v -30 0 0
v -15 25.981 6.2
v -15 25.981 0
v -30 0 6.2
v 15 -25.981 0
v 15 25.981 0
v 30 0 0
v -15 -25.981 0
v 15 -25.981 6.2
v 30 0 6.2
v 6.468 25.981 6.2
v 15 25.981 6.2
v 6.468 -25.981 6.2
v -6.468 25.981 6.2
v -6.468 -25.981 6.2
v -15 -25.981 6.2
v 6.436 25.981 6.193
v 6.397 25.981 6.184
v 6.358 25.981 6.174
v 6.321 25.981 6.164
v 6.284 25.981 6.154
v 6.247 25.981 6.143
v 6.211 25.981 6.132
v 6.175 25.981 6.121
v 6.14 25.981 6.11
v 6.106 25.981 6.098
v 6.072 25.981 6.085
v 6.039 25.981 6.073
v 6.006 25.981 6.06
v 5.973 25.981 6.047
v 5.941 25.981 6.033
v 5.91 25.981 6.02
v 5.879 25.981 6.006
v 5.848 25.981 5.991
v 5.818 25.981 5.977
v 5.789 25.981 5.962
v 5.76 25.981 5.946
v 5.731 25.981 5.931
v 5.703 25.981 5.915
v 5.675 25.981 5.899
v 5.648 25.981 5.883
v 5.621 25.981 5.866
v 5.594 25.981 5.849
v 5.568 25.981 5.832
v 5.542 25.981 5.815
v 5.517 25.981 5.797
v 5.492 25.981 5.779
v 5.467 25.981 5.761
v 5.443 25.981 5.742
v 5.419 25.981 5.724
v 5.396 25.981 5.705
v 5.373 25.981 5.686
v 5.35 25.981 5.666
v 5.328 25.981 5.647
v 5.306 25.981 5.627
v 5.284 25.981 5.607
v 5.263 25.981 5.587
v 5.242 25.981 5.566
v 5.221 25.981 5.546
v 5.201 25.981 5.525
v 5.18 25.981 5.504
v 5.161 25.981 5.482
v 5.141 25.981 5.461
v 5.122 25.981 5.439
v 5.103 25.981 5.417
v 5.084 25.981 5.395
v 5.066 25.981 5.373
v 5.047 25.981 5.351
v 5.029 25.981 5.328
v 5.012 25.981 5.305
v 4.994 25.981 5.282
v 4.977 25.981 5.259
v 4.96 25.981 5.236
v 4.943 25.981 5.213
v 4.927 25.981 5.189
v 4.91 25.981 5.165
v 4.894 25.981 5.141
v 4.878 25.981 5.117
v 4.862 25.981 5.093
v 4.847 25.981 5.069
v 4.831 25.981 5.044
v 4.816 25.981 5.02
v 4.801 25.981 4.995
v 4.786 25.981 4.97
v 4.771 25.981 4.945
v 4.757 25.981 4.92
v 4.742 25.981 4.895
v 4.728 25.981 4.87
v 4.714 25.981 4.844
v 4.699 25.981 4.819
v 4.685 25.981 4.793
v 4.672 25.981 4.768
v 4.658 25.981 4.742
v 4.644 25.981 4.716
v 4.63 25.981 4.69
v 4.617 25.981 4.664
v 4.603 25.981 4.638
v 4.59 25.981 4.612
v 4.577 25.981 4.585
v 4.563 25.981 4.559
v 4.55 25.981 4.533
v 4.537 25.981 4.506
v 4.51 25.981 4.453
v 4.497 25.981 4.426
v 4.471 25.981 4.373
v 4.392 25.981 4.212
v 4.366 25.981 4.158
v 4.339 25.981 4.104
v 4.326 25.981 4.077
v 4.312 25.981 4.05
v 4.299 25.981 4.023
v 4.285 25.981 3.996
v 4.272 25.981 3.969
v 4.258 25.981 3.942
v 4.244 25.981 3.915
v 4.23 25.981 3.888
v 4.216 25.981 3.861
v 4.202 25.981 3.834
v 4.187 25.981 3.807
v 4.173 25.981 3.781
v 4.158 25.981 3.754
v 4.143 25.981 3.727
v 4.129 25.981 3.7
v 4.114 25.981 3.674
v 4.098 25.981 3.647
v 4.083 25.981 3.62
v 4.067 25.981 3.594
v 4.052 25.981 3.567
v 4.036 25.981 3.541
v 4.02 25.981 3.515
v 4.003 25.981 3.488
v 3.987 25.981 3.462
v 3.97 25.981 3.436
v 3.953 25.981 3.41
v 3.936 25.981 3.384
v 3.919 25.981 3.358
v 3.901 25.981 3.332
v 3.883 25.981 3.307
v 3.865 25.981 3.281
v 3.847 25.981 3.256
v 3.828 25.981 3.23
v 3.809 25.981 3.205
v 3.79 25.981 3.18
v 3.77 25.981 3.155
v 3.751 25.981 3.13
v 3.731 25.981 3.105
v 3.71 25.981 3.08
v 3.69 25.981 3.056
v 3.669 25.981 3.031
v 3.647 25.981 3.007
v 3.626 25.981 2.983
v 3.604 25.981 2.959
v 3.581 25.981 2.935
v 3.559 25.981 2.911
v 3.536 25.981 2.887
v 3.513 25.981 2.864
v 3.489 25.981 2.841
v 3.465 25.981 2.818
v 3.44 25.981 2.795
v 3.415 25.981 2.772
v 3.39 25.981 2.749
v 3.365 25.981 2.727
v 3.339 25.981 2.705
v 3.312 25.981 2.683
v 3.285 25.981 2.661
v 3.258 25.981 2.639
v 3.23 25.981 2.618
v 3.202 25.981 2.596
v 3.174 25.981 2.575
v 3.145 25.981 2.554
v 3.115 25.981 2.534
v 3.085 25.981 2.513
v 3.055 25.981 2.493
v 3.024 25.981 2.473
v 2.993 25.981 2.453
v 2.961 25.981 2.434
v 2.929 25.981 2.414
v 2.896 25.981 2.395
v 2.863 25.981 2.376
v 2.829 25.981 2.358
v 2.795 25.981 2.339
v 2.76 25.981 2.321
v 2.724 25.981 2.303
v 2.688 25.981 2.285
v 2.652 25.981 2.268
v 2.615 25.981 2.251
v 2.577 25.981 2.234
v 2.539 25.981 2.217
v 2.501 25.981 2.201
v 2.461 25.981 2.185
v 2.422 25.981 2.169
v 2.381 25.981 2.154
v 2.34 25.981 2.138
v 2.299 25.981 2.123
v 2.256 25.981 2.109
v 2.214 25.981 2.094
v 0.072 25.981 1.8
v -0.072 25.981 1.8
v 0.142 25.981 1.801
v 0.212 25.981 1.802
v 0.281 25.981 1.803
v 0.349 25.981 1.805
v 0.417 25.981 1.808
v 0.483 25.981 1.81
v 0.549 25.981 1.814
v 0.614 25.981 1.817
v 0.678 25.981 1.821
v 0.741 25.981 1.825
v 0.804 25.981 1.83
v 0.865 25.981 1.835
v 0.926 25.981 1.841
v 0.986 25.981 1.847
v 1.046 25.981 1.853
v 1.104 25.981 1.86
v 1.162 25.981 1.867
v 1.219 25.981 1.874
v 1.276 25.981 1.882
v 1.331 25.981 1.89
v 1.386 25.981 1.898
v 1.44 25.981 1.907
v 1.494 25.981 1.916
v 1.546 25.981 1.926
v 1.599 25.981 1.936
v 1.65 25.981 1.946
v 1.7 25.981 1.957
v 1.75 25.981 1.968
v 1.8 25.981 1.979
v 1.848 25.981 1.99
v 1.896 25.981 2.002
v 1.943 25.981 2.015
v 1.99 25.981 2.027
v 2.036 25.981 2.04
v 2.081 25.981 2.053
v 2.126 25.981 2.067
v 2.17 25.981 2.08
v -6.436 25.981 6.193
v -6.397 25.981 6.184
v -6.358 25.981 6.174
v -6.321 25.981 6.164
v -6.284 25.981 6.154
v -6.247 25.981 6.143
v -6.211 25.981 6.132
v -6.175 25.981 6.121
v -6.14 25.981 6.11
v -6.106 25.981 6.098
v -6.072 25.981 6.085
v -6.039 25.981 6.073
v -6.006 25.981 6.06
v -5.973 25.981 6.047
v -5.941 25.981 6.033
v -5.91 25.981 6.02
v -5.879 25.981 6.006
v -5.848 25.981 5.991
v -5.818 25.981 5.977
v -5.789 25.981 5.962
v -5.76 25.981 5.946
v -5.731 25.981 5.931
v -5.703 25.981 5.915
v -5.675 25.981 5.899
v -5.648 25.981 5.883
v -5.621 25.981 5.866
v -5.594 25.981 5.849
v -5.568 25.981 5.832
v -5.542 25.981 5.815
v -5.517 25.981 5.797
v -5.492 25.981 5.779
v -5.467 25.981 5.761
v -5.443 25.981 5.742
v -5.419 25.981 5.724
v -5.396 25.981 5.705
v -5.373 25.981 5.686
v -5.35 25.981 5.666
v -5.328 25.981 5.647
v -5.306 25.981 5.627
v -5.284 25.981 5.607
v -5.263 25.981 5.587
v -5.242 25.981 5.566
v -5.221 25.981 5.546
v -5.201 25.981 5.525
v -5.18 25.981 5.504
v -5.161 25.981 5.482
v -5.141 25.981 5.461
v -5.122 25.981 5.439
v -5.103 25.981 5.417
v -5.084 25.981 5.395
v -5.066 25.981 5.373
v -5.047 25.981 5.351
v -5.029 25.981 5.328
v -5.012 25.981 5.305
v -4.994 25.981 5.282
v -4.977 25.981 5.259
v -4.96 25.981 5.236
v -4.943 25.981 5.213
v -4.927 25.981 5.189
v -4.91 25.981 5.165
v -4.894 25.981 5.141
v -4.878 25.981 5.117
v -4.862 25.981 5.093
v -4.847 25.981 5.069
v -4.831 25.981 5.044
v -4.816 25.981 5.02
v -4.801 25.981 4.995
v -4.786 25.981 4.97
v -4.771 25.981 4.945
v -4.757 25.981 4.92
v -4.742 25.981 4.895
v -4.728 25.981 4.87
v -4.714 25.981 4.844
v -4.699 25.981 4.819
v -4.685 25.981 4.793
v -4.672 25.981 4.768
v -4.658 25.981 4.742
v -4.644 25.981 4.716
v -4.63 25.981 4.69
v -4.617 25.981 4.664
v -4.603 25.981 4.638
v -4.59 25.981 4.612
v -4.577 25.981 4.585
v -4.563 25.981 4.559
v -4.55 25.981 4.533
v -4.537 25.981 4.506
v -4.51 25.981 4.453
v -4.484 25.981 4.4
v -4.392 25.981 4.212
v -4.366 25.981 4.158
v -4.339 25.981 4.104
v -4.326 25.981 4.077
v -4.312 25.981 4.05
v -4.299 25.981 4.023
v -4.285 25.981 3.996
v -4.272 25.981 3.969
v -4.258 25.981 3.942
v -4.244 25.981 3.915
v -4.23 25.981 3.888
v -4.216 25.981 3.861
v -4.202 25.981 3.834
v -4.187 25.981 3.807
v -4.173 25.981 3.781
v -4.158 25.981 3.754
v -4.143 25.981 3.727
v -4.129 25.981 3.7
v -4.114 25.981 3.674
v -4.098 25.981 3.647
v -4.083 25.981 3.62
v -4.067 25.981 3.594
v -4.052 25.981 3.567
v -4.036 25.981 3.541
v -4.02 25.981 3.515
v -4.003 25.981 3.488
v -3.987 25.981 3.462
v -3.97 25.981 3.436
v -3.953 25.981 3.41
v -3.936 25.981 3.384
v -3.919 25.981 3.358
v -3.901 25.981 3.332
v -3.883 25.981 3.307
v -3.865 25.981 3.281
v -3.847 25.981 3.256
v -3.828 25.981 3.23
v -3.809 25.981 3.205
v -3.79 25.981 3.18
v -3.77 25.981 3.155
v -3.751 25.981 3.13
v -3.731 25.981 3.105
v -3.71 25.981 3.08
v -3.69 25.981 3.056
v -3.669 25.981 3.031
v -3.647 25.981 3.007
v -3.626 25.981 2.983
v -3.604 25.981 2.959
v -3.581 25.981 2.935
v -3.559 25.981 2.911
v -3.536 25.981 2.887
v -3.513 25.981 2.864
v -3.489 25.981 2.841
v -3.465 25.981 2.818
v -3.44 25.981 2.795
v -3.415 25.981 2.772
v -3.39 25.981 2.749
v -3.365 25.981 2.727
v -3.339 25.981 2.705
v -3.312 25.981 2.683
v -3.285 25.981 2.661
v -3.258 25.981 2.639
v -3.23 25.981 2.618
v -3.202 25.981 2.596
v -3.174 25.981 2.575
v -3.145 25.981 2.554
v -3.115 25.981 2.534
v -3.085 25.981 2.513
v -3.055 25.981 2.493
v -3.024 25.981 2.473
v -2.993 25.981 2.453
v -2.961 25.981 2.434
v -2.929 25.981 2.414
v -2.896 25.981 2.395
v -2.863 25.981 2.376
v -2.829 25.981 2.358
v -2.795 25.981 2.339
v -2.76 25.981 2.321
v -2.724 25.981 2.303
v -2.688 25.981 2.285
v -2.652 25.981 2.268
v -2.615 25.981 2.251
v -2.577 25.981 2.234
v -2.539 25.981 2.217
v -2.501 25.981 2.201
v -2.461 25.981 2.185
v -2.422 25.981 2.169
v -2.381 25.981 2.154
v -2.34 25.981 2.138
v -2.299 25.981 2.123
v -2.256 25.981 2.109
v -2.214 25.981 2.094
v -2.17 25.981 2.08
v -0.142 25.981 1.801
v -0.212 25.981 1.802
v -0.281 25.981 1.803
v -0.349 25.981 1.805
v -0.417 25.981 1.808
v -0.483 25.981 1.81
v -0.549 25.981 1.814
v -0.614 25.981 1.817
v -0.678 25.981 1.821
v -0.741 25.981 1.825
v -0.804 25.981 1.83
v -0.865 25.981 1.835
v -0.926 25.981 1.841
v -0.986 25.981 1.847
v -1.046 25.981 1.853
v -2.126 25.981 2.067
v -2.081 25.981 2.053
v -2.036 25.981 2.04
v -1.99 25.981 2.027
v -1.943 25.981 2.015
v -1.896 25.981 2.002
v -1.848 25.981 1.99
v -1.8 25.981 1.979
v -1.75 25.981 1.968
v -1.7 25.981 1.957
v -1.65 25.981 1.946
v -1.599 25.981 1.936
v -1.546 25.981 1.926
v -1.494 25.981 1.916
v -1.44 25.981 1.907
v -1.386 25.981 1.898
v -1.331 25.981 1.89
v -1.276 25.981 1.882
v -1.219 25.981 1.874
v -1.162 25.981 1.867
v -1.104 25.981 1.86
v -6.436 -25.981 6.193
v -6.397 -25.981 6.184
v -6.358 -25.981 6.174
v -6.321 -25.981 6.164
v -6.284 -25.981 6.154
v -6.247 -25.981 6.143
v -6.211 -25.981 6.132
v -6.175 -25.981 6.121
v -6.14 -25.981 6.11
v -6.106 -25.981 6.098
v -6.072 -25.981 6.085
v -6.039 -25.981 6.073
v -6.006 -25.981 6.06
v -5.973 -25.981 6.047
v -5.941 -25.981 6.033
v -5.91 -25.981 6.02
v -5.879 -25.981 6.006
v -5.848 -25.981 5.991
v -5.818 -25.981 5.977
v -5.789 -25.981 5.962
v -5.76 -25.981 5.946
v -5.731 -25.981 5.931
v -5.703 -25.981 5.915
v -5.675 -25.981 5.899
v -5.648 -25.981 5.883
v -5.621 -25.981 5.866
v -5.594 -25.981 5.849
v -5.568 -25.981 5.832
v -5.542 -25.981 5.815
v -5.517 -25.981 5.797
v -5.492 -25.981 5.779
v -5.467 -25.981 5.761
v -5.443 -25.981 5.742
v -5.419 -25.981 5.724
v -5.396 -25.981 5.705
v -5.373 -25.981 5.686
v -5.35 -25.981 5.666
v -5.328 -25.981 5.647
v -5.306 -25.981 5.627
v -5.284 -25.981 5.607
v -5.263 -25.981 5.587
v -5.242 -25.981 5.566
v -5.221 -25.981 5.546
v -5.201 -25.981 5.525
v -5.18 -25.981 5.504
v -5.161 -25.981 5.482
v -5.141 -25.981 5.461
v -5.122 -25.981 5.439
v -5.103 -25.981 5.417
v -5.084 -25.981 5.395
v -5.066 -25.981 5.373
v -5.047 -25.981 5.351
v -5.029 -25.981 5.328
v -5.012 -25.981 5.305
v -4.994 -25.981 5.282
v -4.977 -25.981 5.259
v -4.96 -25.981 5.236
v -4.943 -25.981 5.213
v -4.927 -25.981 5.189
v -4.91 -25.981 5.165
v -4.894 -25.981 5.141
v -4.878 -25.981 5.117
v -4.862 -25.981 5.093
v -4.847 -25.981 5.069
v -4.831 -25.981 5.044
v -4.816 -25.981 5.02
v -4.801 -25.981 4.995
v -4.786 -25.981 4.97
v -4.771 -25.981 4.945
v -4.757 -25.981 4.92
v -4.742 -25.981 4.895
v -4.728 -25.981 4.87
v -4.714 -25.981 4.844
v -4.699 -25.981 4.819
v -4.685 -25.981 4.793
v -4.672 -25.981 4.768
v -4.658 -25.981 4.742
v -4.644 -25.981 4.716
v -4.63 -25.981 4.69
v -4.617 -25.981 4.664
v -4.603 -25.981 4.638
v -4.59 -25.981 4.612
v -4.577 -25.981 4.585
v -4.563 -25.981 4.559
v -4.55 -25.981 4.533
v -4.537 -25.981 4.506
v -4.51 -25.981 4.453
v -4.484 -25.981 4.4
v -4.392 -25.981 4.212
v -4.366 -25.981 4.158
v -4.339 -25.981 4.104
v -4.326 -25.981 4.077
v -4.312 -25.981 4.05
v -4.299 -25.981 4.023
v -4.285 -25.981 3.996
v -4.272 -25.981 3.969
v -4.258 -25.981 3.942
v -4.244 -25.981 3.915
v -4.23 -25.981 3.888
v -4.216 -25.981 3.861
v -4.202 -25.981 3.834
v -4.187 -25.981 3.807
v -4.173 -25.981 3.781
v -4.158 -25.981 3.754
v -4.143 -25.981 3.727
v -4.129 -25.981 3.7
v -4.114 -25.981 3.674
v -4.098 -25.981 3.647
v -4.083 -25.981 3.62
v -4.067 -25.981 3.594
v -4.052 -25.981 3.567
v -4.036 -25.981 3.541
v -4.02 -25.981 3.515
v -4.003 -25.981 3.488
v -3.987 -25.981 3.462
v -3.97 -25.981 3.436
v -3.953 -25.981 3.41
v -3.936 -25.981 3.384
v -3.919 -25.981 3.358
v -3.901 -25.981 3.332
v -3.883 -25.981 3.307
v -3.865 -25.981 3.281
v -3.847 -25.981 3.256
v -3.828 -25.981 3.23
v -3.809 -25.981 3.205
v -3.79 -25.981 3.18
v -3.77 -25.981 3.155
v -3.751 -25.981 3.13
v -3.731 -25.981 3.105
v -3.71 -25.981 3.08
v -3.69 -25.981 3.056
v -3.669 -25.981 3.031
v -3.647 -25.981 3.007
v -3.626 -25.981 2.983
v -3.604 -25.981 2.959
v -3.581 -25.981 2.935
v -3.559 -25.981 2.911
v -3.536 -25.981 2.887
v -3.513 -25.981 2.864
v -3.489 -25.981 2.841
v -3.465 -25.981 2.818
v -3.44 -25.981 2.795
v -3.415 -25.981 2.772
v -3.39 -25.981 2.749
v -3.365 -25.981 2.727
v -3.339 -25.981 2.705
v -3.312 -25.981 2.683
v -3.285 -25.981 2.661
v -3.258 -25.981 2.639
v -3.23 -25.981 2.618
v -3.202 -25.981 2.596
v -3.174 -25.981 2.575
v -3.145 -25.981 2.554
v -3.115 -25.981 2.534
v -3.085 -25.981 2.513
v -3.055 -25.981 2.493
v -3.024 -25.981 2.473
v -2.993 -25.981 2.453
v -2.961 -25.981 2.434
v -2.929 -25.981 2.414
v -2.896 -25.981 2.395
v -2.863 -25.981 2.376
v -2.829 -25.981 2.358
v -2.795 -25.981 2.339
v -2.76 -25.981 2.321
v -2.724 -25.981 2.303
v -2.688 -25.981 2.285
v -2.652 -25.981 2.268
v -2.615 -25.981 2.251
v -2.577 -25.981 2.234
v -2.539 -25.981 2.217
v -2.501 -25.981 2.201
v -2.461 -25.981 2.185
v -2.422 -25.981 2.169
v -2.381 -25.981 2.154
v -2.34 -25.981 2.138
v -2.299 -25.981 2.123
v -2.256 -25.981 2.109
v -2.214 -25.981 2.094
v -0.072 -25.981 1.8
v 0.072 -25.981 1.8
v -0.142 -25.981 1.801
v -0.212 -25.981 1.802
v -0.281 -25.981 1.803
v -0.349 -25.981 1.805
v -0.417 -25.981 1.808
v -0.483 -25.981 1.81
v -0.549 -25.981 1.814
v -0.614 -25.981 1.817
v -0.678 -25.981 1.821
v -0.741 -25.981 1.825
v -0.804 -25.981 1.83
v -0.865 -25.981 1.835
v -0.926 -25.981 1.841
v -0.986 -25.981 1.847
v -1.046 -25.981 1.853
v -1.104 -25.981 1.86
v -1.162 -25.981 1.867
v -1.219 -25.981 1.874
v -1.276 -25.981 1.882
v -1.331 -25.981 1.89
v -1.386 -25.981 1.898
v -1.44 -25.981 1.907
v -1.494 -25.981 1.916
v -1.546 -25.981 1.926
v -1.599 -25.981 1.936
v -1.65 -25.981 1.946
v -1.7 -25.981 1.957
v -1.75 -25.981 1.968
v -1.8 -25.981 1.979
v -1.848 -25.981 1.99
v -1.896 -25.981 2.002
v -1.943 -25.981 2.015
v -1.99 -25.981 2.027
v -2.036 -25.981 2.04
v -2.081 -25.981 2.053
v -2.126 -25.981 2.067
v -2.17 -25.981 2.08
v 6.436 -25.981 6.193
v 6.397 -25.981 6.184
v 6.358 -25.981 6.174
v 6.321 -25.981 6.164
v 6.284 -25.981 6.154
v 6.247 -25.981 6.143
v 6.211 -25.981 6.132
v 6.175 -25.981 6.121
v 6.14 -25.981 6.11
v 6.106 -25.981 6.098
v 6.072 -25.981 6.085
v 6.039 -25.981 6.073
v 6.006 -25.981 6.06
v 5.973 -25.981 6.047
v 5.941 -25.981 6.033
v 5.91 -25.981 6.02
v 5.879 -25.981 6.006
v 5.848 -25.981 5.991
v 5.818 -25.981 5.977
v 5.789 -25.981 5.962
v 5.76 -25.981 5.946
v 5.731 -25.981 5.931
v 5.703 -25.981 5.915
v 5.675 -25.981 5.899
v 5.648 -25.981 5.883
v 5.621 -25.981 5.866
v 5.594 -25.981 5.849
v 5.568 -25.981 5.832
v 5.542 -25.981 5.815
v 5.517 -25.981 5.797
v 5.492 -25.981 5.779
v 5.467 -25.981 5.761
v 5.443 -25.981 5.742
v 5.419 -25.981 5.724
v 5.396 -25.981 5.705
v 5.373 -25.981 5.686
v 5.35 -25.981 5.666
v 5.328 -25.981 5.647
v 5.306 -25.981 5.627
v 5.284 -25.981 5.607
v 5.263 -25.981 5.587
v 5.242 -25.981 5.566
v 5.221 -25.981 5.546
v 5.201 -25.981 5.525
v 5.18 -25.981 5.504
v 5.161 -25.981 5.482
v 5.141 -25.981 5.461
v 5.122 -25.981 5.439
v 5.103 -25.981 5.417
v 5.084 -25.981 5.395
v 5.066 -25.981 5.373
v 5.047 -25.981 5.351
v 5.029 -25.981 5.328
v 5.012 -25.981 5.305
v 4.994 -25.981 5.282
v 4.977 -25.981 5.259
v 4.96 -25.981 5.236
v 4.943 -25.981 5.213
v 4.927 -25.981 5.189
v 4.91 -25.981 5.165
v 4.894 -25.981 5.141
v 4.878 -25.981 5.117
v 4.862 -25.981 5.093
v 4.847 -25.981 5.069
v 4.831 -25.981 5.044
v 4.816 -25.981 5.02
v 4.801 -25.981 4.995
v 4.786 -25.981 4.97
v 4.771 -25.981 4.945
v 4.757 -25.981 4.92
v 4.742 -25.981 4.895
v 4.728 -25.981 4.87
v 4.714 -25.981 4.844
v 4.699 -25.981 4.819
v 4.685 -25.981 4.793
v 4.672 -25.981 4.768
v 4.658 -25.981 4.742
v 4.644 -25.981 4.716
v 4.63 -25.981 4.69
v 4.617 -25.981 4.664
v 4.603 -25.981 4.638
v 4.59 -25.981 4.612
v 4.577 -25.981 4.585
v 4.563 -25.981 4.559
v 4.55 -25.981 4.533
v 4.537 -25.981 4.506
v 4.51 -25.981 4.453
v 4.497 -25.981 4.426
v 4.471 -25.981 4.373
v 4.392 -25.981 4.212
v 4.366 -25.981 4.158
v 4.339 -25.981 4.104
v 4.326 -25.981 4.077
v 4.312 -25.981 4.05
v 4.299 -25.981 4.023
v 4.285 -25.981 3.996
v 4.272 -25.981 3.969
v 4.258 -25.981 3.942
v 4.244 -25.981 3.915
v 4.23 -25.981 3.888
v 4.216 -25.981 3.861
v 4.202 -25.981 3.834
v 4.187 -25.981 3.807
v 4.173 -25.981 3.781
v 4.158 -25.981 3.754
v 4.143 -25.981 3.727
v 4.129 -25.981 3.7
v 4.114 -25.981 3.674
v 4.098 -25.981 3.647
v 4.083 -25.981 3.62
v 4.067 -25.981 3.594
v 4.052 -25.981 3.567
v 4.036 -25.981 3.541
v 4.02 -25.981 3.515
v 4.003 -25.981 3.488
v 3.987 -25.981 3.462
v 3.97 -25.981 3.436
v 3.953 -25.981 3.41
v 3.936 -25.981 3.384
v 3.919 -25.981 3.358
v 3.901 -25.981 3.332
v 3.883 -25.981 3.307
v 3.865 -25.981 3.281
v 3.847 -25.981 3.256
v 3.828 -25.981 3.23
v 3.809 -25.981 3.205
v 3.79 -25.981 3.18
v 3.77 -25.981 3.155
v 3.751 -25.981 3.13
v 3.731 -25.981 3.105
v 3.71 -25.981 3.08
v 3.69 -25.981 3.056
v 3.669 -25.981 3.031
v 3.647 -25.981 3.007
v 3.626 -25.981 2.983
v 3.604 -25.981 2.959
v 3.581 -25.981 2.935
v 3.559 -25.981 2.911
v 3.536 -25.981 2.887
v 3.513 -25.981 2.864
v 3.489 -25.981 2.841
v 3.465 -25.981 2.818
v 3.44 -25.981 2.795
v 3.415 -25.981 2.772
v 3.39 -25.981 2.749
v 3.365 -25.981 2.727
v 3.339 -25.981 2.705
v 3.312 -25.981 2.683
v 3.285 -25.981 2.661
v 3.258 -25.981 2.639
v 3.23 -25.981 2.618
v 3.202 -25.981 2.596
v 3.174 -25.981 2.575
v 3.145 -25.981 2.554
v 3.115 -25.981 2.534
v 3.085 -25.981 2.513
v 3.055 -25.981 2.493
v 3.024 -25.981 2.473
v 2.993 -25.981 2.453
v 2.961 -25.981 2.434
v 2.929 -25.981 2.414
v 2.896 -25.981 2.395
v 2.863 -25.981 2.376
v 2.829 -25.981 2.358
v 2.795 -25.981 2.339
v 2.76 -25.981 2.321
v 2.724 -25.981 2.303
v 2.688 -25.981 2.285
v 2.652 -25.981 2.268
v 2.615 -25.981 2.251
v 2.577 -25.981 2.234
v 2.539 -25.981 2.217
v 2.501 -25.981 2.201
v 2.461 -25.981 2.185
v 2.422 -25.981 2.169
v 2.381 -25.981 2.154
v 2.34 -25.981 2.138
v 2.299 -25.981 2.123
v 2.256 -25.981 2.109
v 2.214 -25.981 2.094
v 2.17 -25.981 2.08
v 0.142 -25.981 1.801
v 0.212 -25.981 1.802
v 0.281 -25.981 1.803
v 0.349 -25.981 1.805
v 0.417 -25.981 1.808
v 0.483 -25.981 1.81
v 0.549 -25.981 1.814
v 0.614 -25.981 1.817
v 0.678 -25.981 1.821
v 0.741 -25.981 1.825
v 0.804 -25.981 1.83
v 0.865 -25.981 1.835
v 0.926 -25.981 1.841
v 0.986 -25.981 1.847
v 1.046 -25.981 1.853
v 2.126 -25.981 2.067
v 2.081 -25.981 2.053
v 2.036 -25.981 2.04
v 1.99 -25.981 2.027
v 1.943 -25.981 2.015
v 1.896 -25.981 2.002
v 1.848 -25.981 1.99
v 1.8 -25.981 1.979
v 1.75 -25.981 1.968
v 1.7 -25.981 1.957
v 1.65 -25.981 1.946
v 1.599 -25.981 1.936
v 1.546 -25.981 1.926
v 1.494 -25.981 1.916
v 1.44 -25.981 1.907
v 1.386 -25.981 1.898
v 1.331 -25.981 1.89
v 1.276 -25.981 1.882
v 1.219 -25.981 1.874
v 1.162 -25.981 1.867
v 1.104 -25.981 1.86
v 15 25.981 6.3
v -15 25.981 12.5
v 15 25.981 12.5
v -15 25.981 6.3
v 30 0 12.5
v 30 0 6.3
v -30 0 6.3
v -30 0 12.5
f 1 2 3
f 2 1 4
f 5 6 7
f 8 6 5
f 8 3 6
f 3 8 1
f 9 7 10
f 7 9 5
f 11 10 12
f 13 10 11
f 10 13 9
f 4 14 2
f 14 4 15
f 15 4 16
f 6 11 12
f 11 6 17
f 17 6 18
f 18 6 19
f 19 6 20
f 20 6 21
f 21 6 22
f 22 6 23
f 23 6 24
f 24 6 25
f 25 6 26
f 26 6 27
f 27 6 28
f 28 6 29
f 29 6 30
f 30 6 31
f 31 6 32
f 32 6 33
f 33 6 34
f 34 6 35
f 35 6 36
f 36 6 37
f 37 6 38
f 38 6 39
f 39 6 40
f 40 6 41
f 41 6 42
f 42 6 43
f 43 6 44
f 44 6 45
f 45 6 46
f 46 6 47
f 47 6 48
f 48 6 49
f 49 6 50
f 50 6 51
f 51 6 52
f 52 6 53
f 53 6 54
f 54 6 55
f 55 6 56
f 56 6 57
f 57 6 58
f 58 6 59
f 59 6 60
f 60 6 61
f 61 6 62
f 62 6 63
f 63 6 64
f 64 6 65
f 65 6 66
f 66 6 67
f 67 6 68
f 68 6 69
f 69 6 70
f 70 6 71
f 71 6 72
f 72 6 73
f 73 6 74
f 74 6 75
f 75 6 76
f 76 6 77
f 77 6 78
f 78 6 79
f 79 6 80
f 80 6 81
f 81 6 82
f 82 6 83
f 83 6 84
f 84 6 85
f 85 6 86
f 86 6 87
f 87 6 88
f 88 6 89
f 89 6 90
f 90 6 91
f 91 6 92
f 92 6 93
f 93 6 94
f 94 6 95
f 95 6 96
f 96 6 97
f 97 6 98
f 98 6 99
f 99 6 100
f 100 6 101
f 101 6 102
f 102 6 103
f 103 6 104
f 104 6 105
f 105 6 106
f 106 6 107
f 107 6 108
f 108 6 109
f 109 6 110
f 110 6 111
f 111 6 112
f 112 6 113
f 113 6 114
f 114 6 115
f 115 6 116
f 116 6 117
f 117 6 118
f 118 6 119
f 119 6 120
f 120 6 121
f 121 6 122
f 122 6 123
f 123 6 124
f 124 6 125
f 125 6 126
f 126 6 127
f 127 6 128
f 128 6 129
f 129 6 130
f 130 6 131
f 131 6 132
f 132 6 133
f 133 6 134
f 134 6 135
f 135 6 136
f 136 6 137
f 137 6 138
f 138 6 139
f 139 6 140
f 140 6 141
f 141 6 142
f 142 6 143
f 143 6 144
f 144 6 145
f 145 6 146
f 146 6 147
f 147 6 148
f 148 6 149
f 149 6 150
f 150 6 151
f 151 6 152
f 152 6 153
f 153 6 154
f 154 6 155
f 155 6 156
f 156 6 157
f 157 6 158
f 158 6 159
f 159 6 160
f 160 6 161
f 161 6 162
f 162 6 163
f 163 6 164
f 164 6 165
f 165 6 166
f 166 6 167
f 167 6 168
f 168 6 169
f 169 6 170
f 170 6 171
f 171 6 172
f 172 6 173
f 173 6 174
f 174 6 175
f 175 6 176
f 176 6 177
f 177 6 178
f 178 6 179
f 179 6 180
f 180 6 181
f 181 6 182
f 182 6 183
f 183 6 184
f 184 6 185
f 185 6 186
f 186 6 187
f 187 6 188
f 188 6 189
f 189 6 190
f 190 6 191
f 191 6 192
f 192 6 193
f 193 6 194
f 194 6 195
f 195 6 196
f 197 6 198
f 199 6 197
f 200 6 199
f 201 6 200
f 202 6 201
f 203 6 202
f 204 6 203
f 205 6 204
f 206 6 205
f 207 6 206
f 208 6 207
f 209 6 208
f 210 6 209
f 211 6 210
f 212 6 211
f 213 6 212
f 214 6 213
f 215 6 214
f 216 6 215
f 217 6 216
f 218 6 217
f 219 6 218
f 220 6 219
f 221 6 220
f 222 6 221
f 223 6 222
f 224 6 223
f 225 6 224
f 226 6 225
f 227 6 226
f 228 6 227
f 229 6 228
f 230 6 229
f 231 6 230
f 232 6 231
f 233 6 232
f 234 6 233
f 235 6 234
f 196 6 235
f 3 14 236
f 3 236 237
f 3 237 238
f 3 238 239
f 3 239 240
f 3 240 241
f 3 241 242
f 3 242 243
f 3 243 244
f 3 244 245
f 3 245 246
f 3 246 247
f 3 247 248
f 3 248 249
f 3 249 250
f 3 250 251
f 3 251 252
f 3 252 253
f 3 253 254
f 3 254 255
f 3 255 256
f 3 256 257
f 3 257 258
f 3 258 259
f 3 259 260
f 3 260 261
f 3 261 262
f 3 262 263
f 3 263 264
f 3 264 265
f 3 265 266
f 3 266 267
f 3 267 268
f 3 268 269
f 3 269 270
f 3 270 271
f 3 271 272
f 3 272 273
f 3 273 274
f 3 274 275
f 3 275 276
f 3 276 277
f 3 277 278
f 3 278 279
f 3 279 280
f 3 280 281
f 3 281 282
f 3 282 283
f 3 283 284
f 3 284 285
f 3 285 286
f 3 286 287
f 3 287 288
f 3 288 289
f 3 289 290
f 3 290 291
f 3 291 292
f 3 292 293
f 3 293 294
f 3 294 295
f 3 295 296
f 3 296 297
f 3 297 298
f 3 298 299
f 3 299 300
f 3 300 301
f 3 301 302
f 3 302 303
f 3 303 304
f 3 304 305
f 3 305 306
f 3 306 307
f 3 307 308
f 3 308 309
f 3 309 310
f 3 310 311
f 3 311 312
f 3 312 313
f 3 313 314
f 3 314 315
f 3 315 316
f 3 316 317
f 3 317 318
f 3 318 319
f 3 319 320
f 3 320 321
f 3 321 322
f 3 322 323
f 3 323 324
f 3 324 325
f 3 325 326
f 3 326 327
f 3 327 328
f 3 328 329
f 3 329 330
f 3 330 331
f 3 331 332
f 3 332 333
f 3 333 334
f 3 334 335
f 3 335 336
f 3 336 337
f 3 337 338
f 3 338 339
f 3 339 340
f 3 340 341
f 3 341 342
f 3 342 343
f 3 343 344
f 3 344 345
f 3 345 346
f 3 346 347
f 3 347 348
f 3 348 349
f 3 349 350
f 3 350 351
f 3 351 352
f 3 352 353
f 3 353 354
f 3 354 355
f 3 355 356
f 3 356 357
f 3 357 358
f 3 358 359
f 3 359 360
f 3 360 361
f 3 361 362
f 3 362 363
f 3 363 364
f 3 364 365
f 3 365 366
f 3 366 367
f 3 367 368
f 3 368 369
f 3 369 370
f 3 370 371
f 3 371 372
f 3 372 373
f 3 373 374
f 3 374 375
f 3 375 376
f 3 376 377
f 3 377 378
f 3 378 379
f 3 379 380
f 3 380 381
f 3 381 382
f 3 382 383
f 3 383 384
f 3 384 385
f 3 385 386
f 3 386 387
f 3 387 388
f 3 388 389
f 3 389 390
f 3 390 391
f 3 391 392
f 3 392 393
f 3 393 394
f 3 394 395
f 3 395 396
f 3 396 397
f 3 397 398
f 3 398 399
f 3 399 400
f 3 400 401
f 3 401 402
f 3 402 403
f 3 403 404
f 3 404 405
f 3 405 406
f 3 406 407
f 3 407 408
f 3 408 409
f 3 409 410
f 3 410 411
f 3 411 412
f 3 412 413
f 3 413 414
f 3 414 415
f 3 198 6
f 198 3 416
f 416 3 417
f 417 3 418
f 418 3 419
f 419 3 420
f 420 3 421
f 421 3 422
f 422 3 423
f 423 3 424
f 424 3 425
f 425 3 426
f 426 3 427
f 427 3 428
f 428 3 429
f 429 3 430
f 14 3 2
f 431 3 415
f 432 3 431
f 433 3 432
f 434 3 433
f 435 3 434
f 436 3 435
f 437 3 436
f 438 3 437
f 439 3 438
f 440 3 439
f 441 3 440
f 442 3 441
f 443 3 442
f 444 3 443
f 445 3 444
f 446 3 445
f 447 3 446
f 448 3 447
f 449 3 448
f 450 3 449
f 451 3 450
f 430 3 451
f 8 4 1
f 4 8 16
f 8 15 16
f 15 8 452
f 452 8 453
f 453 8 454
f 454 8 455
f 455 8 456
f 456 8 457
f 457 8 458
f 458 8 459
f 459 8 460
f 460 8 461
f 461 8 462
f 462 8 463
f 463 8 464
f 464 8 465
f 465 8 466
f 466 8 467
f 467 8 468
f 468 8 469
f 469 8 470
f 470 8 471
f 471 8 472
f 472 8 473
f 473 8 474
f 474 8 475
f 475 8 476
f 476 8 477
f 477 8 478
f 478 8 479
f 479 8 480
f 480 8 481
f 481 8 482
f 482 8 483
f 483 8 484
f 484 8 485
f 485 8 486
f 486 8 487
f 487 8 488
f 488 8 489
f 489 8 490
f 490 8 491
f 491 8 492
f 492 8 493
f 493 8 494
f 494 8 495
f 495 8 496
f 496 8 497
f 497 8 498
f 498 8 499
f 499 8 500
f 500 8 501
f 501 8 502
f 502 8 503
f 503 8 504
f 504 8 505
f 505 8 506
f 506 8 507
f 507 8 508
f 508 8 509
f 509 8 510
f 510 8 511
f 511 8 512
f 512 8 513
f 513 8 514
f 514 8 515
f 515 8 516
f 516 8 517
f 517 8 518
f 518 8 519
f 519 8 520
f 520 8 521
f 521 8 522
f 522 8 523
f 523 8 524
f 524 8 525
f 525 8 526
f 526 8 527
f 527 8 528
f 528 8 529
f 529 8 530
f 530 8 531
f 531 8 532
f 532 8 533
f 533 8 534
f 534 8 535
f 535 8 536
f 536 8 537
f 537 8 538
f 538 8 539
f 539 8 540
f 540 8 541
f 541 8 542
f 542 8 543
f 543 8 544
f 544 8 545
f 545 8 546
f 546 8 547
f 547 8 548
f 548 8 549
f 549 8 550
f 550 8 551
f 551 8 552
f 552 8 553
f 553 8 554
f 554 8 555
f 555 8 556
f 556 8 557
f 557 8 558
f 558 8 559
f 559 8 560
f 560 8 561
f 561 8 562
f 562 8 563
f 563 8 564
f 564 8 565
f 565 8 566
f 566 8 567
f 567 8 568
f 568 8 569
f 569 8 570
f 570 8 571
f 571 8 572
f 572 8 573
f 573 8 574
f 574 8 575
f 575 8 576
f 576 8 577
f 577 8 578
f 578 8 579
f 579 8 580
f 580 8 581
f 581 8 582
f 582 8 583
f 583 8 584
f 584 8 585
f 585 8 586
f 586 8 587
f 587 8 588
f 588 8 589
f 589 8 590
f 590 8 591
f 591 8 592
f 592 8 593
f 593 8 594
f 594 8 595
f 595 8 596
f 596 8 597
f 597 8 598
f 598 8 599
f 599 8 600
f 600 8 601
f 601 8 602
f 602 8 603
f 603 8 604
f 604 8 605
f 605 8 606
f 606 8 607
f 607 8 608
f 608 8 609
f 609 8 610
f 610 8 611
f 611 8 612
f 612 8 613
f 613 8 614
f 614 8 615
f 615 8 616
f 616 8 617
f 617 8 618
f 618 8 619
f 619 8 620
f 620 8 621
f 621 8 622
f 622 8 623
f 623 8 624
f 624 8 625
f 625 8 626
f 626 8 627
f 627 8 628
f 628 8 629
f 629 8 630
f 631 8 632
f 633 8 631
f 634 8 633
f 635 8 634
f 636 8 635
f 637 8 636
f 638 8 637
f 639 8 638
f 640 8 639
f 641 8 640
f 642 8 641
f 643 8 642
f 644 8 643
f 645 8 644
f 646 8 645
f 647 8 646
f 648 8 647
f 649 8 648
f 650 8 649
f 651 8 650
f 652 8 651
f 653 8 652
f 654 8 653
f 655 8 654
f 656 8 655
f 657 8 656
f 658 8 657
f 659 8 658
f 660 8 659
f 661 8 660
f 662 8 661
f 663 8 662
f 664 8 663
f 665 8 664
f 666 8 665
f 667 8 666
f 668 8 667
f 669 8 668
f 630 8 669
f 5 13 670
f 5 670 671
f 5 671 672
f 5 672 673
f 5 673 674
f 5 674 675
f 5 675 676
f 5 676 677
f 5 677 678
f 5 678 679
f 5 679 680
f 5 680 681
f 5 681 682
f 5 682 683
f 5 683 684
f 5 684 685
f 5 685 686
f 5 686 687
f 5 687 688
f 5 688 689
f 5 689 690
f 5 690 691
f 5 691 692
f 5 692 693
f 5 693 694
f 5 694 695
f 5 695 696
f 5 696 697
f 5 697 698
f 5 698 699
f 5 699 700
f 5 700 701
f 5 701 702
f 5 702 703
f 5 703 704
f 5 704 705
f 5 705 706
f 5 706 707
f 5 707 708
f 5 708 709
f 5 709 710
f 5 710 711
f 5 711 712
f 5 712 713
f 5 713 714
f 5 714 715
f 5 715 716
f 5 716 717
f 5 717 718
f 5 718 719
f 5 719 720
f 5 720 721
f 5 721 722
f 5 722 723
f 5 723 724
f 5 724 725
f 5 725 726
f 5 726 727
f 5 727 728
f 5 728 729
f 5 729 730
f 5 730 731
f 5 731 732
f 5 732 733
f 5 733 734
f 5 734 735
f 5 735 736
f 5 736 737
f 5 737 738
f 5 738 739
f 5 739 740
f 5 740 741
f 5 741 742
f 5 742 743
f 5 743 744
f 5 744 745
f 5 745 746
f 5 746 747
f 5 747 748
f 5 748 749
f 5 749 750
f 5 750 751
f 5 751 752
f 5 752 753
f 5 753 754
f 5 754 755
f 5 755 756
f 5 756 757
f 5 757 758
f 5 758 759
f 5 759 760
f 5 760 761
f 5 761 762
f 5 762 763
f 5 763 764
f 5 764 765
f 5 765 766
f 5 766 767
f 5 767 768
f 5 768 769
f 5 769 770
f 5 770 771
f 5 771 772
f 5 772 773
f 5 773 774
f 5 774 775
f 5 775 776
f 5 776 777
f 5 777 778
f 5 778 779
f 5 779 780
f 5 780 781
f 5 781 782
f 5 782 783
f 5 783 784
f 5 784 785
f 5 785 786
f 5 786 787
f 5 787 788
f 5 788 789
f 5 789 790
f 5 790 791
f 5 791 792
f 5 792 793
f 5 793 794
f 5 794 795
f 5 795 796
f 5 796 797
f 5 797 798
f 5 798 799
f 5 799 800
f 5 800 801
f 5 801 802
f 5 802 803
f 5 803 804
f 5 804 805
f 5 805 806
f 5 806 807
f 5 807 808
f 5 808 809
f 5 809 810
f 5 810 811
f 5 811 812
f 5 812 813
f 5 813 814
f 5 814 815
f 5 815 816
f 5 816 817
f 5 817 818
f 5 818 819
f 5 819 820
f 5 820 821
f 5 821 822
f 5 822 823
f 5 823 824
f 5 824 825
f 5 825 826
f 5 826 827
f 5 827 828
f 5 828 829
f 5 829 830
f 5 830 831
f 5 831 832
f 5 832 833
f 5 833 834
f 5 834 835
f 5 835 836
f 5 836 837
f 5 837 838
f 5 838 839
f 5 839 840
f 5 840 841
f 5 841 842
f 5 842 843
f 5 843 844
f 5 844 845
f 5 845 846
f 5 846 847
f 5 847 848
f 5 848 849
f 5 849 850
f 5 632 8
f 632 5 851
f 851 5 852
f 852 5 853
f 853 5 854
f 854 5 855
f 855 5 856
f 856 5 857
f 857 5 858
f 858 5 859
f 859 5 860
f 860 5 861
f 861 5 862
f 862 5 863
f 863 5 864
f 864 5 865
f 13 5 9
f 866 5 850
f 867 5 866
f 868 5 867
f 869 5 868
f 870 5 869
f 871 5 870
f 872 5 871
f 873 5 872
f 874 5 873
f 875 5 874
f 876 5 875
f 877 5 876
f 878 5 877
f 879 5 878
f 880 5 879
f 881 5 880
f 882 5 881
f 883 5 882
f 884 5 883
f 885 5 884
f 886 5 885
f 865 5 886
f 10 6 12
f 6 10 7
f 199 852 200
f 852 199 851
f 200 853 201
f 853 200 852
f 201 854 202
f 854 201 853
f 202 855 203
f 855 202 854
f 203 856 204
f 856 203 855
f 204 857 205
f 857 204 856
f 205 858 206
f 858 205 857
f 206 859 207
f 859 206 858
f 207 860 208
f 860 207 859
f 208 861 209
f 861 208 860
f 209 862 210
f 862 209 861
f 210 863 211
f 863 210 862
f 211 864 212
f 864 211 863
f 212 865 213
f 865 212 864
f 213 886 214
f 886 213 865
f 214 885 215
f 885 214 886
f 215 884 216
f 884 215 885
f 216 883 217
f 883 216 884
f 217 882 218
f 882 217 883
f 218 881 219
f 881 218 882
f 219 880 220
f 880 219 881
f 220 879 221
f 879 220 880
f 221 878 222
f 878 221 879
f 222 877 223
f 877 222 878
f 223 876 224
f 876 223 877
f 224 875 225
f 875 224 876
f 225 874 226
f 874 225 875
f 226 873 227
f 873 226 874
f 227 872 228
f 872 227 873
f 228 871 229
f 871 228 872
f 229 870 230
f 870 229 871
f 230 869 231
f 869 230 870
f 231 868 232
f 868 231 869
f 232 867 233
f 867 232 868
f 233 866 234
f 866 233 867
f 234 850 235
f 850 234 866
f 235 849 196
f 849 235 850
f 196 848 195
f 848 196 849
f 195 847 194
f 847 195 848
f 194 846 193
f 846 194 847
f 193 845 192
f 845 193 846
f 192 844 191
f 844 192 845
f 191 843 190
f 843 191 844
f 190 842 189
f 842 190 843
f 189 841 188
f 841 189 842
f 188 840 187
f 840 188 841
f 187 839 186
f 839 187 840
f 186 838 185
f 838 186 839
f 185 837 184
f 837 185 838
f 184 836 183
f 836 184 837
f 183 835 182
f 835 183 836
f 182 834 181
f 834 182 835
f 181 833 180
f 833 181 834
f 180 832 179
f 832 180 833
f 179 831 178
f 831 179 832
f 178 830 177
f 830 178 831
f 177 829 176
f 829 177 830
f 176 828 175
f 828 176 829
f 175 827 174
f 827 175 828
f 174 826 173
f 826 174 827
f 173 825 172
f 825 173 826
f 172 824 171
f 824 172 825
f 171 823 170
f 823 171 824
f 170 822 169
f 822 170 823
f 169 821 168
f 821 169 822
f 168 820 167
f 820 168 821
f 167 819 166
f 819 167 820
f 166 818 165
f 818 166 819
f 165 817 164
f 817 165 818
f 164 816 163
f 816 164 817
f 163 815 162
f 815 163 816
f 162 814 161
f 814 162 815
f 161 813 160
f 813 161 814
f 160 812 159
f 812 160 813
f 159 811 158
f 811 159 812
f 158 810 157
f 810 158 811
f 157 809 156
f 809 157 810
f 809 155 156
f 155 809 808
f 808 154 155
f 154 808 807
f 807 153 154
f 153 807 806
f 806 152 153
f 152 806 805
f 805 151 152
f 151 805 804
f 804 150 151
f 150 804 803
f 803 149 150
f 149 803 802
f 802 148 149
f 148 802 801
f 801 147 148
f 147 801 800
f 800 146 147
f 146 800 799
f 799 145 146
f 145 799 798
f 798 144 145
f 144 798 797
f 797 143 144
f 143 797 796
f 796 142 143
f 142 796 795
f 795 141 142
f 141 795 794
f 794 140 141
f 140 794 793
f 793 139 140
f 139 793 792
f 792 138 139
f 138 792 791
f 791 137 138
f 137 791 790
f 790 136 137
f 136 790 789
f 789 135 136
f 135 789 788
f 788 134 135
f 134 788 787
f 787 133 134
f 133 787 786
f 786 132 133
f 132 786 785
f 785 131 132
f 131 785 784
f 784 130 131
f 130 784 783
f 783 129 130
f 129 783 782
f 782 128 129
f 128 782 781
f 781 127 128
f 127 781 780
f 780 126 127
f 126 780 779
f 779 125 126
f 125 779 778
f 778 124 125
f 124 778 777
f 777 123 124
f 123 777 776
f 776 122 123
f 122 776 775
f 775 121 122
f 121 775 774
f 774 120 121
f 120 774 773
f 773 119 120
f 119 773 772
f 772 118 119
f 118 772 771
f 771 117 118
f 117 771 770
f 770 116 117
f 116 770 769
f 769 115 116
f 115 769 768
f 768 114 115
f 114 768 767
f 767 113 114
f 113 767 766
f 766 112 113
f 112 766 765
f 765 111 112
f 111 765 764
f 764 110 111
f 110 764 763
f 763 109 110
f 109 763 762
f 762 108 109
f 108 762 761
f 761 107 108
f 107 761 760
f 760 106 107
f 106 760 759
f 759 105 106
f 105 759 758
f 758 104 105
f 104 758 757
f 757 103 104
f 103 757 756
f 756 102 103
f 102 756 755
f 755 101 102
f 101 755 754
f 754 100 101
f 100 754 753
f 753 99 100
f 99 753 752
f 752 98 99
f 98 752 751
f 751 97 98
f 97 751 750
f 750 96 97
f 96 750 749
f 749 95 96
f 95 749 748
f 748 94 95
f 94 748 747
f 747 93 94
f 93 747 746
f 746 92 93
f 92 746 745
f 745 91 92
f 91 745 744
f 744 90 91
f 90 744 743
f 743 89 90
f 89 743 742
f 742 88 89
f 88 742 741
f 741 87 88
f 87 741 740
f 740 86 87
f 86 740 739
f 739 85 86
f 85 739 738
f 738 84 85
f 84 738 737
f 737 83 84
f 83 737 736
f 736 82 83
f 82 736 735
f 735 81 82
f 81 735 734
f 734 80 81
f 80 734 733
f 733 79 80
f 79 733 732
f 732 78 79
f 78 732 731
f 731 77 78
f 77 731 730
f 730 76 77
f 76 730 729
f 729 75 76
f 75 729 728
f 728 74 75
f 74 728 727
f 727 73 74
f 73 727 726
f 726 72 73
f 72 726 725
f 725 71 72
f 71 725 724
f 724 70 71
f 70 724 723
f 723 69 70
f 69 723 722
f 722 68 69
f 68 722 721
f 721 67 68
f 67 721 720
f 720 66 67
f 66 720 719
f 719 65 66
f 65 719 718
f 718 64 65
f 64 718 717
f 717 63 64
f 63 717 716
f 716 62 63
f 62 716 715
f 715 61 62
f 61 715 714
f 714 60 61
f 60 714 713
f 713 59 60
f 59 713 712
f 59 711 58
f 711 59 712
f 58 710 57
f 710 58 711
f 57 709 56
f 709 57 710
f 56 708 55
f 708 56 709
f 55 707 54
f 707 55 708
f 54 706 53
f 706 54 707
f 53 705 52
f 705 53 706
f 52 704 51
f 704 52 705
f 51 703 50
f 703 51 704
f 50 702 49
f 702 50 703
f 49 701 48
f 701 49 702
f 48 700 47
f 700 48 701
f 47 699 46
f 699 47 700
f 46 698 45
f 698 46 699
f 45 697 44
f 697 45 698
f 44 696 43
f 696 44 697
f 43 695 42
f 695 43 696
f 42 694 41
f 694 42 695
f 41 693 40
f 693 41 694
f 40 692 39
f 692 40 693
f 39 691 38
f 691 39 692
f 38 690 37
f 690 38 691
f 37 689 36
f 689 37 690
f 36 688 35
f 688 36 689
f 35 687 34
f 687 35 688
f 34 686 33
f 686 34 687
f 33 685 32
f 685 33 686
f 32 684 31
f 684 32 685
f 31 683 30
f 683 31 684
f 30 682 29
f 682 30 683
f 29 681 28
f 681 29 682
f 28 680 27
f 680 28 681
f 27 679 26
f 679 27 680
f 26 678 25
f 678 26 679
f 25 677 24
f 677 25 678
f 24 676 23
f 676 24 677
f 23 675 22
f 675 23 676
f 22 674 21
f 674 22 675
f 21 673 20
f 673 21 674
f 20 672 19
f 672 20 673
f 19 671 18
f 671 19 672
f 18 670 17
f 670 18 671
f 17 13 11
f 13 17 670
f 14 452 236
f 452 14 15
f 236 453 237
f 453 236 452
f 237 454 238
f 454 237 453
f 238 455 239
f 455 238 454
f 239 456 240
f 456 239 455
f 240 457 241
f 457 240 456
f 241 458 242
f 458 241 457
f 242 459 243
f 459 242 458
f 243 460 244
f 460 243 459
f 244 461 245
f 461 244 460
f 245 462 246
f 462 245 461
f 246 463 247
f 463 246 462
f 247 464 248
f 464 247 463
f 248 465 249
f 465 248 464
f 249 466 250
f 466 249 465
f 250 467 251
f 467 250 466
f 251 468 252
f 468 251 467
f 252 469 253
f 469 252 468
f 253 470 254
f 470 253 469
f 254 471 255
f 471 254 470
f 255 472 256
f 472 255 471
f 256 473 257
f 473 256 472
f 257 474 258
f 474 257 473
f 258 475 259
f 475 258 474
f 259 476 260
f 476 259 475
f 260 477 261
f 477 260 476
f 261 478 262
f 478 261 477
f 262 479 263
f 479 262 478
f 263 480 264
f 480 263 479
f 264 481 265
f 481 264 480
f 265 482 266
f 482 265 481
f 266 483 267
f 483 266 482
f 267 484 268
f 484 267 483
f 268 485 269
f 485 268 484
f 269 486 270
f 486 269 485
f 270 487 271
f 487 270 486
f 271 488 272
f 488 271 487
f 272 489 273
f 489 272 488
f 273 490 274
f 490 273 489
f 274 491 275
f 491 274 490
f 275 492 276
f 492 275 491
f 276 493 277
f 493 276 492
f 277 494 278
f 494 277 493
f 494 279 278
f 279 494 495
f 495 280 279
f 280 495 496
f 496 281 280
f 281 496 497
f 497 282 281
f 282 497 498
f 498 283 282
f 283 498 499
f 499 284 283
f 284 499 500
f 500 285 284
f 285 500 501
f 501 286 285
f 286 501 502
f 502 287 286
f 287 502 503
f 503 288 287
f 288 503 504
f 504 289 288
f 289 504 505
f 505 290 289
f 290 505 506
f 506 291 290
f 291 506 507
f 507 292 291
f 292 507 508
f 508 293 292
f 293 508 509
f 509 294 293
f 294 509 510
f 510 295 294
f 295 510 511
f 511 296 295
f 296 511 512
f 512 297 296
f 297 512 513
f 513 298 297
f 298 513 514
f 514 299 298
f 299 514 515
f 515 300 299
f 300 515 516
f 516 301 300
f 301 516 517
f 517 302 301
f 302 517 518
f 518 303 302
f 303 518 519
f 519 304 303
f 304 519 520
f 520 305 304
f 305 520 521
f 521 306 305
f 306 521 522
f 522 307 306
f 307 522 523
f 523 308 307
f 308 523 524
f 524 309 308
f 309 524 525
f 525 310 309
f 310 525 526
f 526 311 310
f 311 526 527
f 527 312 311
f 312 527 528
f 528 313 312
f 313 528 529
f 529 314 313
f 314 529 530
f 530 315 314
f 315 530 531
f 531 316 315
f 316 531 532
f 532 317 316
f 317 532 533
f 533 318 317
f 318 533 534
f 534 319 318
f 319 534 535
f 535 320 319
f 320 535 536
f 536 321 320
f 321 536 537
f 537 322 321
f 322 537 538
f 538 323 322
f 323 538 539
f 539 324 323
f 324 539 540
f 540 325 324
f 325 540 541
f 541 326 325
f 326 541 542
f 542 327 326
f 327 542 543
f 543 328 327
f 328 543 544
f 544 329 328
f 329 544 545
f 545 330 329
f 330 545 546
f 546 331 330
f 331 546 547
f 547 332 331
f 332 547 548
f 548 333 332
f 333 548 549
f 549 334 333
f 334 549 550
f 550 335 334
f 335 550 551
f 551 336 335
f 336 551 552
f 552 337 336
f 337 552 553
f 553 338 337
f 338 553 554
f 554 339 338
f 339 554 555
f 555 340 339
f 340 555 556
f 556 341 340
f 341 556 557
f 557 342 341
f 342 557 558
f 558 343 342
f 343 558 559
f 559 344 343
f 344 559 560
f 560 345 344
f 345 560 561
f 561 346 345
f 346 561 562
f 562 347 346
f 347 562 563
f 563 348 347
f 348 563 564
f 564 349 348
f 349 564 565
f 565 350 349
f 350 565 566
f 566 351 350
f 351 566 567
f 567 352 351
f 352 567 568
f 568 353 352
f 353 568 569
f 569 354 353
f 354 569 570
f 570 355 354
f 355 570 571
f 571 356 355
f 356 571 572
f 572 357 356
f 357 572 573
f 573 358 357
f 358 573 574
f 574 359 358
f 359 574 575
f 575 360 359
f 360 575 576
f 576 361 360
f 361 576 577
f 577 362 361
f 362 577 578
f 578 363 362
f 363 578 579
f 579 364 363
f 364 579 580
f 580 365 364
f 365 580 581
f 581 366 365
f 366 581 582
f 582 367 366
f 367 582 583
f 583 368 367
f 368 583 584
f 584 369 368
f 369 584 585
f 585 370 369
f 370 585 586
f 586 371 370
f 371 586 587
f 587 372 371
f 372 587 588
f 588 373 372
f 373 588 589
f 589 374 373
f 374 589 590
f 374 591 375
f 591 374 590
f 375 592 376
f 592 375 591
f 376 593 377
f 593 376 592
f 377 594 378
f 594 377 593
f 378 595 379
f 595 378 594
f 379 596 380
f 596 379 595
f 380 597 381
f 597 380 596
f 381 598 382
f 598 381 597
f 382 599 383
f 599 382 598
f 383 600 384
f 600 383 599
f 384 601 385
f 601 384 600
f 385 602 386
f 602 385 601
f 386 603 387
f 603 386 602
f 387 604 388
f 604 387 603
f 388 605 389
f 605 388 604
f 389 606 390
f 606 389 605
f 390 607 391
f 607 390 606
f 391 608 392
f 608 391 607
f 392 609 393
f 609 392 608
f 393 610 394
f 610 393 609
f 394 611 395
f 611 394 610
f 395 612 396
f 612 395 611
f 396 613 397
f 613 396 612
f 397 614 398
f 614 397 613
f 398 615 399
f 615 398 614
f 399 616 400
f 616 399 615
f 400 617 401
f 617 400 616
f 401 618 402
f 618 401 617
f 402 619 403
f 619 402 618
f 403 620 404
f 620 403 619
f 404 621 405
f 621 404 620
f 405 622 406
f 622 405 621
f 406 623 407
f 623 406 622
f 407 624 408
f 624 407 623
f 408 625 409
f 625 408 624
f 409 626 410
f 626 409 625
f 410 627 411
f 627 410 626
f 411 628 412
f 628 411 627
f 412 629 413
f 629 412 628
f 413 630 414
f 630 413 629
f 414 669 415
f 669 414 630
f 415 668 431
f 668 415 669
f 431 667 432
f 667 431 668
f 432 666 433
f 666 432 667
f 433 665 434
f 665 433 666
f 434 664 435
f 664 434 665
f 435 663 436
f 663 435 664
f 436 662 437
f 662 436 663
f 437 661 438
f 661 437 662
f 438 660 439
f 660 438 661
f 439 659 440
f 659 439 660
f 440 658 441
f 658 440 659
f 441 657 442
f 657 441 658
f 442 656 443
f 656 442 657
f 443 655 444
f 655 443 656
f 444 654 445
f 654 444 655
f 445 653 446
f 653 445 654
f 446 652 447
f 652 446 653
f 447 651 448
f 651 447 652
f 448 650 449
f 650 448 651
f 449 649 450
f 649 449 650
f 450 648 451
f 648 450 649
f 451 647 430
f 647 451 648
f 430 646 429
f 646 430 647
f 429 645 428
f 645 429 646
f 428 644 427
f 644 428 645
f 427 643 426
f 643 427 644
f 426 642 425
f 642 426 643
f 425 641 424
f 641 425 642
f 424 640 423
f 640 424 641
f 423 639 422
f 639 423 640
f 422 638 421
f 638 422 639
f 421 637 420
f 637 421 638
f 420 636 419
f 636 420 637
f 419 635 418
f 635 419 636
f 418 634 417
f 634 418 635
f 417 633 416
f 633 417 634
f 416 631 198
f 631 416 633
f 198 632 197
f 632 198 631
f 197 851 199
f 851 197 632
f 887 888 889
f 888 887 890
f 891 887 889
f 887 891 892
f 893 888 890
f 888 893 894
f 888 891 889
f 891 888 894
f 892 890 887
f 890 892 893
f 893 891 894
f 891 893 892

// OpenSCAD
// resolution bezier curve
deltat = 0.004;

// cubic bexier curve function
function cubic_bezier(p0,p1,p2,p3) = [for (t=[0:deltat:1+deltat]) pow(1-t,3)*p0+3*pow((1-t),2)*t*p1+3*(1-t)*pow(t,2)*p2+pow(t,3)*p3];
    
function reverse(v) = [for (i=[len(v)-1:-1:0]) v[i]];
function delete_first(v) = [for (i=[1:len(v)-1]) v[i]]; 

// cubic bezier curve for canal shape 
p10 = [-7.5, 6.3];
p11 = [-3.0, 6.3];
p12 = [-6.0, 1.8];
p13 = [0.0, 1.8];

p20 = [7.5, 6.3];
p21 = [3.0, 6.3];
p22 = [6.0, 1.8];
p23 = [0.0, 1.8];


// bezier curve
points_left = cubic_bezier(p10, p11, p12, p13);
points_right = reverse(cubic_bezier(p20, p21, p22, p23));
points = concat(points_left, points_right);

difference()
{
    color("Peru", 1.0)
    {
        // hexagon base
        linear_extrude(height = 6.2, center = false, convexity = 10, twist = 0)
        circle(30, $fn=6);
    }
    
    color("DodgerBlue", 1.0)
    {
        // canal shape
        rotate([90,0,0])
        linear_extrude(height = 120, center = true, convexity = 10, twist = 0)
        polygon(points);
    }
    
}

r=30;
h=6.2;
// small number
e=.02;

translate([0,0, 6.3])
difference(){
    color("Peru", 1.0)
    {
        cylinder(h,r,r, $fn=6);
    }
    translate([-r, -2*r,-e])
    cube([2*r,2*r,h+2*e]);    
}
